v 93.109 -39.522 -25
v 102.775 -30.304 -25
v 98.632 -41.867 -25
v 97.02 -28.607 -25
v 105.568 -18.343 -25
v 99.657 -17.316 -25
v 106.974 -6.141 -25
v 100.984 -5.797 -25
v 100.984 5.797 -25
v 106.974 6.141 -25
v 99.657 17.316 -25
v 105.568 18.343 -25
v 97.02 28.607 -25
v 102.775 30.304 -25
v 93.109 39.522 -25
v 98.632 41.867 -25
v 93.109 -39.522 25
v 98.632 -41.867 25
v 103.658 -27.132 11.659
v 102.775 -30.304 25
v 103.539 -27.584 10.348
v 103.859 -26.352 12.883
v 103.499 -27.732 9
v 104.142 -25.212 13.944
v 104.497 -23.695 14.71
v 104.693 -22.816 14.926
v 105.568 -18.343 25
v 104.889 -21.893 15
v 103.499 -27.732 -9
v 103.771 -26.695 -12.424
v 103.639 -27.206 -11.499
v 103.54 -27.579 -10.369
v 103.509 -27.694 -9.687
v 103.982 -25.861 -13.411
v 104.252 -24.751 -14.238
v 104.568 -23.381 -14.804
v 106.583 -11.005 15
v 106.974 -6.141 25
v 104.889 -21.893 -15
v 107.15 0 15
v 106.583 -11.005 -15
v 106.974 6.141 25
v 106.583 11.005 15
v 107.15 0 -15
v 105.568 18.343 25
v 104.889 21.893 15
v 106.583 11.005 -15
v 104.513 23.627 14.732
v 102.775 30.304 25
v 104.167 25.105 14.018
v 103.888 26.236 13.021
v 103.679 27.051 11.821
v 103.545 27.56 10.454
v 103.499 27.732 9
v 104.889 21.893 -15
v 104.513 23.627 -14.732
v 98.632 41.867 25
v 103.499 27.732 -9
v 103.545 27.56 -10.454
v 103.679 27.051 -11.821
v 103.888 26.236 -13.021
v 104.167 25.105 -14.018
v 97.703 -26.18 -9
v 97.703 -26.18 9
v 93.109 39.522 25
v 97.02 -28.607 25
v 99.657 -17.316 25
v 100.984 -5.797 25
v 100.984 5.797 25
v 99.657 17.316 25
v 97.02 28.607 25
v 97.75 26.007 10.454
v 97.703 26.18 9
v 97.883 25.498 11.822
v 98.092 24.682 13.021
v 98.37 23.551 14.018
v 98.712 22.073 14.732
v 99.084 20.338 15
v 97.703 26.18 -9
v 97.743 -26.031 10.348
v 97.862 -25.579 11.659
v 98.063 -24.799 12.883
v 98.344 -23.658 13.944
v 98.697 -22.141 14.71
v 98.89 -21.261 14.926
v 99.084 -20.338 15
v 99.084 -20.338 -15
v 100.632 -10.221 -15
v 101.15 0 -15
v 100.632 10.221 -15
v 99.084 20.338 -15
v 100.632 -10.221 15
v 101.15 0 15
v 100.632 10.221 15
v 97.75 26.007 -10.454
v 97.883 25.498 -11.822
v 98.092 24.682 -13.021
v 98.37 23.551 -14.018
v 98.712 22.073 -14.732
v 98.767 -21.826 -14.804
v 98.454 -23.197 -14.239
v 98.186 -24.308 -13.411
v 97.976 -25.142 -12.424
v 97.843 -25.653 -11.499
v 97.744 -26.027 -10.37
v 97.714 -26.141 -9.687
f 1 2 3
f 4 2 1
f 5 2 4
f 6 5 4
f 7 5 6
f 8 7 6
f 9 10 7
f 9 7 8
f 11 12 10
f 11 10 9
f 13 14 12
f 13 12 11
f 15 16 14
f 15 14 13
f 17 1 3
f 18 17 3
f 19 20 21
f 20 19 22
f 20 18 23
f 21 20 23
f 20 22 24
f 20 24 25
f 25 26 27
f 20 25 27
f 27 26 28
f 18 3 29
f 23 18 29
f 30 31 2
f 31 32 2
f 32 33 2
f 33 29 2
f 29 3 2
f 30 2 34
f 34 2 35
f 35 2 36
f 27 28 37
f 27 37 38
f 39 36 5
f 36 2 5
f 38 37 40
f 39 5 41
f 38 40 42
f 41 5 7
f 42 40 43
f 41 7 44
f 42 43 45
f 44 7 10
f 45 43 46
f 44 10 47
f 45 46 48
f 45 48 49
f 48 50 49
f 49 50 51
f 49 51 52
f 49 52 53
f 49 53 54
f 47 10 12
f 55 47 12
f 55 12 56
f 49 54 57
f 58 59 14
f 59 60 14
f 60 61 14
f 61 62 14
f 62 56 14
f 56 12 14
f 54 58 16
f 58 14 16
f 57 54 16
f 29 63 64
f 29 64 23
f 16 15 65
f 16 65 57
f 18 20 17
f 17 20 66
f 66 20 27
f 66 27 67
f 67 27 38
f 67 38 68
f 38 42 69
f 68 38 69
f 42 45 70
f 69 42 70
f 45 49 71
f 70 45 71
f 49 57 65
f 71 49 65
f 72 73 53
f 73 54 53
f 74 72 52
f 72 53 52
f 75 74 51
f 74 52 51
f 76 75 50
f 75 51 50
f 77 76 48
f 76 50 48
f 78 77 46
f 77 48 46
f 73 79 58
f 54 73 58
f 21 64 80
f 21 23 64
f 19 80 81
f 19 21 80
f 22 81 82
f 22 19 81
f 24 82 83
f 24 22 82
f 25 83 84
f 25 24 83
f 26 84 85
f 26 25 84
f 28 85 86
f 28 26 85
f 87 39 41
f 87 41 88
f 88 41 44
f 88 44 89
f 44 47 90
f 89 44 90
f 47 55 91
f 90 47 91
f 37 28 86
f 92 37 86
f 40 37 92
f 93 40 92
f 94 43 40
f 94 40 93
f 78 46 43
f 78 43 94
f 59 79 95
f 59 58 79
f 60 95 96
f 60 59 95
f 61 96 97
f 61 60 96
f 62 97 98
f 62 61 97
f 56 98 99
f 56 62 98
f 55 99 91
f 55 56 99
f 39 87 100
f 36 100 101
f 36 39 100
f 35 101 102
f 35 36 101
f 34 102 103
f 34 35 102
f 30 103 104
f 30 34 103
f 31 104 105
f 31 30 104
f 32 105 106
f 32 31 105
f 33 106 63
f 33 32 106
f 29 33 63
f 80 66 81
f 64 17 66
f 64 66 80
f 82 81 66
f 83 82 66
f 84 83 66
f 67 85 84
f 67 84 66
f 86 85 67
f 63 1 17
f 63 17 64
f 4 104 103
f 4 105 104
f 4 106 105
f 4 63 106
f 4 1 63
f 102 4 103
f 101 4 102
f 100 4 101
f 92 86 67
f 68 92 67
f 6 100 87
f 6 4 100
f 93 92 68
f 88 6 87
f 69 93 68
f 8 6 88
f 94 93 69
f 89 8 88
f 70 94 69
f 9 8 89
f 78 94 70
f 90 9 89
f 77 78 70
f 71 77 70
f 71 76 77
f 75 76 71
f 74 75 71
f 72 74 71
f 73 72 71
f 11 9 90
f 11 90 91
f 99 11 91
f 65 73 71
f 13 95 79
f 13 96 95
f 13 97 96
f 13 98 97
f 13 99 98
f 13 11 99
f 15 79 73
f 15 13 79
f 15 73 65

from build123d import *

# Parameters (mm, degrees)
SKETCH3_W                    = 6
SKETCH3_H                    = 50
REVOLVE1_ANGLE               = 23
REVOLVE1_OTHER_WAY_ANGLE     = 23
SKETCH4_W                    = 6
SKETCH4_H                    = 30
CUT_REVOLVE1_ANGLE           = 15
CUT_REVOLVE1_OTHER_WAY_ANGLE = 15
FILLET1_R                    = 6


with BuildPart() as part:
    # Sketch3 → Revolve1 (revolve)
    with BuildSketch(Plane(origin=(0, 0, 0), x_dir=(1, 0, 0), z_dir=(0, 1, 0))):
        with Locations((104.15, 0)):
            Rectangle(SKETCH3_W, SKETCH3_H)
    revolve(axis=Axis((0, 0, 17.71875), (0, 0, -1)), revolution_arc=REVOLVE1_ANGLE)

    # Sketch3 → Revolve1 other way (revolve)
    with BuildSketch(Plane(origin=(0, 0, 0), x_dir=(1, 0, 0), z_dir=(0, 1, 0))):
        with Locations((104.15, 0)):
            Rectangle(SKETCH3_W, SKETCH3_H)
    revolve(axis=Axis((0, 0, 17.71875), (0, 0, 1)), revolution_arc=REVOLVE1_OTHER_WAY_ANGLE)

    # Sketch4 → Cut-Revolve1 (revolve, cut)
    with BuildSketch(Plane(origin=(0, 0, 0), x_dir=(1, 0, 0), z_dir=(0, 1, 0))):
        with Locations((104.15, 0)):
            Rectangle(SKETCH4_W, SKETCH4_H)
    revolve(axis=Axis((0, 0, 15), (0, 0, -1)), revolution_arc=CUT_REVOLVE1_ANGLE, mode=Mode.SUBTRACT)

    # Sketch4 → Cut-Revolve1 other way (revolve, cut)
    with BuildSketch(Plane(origin=(0, 0, 0), x_dir=(1, 0, 0), z_dir=(0, 1, 0))):
        with Locations((104.15, 0)):
            Rectangle(SKETCH4_W, SKETCH4_H)
    revolve(axis=Axis((0, 0, 15), (0, 0, 1)), revolution_arc=CUT_REVOLVE1_OTHER_WAY_ANGLE, mode=Mode.SUBTRACT)

    # Fillet1
    fillet1_edges = [part.edges().sort_by_distance(p)[0] for p in [
        (100.601174808, -26.956003547, 15),
        (100.601174808, -26.956003547, -15),
        (100.601174808, 26.956003547, 15),
        (100.601174808, 26.956003547, -15),
    ]]
    fillet(fillet1_edges, radius=FILLET1_R)


solid = part.part
